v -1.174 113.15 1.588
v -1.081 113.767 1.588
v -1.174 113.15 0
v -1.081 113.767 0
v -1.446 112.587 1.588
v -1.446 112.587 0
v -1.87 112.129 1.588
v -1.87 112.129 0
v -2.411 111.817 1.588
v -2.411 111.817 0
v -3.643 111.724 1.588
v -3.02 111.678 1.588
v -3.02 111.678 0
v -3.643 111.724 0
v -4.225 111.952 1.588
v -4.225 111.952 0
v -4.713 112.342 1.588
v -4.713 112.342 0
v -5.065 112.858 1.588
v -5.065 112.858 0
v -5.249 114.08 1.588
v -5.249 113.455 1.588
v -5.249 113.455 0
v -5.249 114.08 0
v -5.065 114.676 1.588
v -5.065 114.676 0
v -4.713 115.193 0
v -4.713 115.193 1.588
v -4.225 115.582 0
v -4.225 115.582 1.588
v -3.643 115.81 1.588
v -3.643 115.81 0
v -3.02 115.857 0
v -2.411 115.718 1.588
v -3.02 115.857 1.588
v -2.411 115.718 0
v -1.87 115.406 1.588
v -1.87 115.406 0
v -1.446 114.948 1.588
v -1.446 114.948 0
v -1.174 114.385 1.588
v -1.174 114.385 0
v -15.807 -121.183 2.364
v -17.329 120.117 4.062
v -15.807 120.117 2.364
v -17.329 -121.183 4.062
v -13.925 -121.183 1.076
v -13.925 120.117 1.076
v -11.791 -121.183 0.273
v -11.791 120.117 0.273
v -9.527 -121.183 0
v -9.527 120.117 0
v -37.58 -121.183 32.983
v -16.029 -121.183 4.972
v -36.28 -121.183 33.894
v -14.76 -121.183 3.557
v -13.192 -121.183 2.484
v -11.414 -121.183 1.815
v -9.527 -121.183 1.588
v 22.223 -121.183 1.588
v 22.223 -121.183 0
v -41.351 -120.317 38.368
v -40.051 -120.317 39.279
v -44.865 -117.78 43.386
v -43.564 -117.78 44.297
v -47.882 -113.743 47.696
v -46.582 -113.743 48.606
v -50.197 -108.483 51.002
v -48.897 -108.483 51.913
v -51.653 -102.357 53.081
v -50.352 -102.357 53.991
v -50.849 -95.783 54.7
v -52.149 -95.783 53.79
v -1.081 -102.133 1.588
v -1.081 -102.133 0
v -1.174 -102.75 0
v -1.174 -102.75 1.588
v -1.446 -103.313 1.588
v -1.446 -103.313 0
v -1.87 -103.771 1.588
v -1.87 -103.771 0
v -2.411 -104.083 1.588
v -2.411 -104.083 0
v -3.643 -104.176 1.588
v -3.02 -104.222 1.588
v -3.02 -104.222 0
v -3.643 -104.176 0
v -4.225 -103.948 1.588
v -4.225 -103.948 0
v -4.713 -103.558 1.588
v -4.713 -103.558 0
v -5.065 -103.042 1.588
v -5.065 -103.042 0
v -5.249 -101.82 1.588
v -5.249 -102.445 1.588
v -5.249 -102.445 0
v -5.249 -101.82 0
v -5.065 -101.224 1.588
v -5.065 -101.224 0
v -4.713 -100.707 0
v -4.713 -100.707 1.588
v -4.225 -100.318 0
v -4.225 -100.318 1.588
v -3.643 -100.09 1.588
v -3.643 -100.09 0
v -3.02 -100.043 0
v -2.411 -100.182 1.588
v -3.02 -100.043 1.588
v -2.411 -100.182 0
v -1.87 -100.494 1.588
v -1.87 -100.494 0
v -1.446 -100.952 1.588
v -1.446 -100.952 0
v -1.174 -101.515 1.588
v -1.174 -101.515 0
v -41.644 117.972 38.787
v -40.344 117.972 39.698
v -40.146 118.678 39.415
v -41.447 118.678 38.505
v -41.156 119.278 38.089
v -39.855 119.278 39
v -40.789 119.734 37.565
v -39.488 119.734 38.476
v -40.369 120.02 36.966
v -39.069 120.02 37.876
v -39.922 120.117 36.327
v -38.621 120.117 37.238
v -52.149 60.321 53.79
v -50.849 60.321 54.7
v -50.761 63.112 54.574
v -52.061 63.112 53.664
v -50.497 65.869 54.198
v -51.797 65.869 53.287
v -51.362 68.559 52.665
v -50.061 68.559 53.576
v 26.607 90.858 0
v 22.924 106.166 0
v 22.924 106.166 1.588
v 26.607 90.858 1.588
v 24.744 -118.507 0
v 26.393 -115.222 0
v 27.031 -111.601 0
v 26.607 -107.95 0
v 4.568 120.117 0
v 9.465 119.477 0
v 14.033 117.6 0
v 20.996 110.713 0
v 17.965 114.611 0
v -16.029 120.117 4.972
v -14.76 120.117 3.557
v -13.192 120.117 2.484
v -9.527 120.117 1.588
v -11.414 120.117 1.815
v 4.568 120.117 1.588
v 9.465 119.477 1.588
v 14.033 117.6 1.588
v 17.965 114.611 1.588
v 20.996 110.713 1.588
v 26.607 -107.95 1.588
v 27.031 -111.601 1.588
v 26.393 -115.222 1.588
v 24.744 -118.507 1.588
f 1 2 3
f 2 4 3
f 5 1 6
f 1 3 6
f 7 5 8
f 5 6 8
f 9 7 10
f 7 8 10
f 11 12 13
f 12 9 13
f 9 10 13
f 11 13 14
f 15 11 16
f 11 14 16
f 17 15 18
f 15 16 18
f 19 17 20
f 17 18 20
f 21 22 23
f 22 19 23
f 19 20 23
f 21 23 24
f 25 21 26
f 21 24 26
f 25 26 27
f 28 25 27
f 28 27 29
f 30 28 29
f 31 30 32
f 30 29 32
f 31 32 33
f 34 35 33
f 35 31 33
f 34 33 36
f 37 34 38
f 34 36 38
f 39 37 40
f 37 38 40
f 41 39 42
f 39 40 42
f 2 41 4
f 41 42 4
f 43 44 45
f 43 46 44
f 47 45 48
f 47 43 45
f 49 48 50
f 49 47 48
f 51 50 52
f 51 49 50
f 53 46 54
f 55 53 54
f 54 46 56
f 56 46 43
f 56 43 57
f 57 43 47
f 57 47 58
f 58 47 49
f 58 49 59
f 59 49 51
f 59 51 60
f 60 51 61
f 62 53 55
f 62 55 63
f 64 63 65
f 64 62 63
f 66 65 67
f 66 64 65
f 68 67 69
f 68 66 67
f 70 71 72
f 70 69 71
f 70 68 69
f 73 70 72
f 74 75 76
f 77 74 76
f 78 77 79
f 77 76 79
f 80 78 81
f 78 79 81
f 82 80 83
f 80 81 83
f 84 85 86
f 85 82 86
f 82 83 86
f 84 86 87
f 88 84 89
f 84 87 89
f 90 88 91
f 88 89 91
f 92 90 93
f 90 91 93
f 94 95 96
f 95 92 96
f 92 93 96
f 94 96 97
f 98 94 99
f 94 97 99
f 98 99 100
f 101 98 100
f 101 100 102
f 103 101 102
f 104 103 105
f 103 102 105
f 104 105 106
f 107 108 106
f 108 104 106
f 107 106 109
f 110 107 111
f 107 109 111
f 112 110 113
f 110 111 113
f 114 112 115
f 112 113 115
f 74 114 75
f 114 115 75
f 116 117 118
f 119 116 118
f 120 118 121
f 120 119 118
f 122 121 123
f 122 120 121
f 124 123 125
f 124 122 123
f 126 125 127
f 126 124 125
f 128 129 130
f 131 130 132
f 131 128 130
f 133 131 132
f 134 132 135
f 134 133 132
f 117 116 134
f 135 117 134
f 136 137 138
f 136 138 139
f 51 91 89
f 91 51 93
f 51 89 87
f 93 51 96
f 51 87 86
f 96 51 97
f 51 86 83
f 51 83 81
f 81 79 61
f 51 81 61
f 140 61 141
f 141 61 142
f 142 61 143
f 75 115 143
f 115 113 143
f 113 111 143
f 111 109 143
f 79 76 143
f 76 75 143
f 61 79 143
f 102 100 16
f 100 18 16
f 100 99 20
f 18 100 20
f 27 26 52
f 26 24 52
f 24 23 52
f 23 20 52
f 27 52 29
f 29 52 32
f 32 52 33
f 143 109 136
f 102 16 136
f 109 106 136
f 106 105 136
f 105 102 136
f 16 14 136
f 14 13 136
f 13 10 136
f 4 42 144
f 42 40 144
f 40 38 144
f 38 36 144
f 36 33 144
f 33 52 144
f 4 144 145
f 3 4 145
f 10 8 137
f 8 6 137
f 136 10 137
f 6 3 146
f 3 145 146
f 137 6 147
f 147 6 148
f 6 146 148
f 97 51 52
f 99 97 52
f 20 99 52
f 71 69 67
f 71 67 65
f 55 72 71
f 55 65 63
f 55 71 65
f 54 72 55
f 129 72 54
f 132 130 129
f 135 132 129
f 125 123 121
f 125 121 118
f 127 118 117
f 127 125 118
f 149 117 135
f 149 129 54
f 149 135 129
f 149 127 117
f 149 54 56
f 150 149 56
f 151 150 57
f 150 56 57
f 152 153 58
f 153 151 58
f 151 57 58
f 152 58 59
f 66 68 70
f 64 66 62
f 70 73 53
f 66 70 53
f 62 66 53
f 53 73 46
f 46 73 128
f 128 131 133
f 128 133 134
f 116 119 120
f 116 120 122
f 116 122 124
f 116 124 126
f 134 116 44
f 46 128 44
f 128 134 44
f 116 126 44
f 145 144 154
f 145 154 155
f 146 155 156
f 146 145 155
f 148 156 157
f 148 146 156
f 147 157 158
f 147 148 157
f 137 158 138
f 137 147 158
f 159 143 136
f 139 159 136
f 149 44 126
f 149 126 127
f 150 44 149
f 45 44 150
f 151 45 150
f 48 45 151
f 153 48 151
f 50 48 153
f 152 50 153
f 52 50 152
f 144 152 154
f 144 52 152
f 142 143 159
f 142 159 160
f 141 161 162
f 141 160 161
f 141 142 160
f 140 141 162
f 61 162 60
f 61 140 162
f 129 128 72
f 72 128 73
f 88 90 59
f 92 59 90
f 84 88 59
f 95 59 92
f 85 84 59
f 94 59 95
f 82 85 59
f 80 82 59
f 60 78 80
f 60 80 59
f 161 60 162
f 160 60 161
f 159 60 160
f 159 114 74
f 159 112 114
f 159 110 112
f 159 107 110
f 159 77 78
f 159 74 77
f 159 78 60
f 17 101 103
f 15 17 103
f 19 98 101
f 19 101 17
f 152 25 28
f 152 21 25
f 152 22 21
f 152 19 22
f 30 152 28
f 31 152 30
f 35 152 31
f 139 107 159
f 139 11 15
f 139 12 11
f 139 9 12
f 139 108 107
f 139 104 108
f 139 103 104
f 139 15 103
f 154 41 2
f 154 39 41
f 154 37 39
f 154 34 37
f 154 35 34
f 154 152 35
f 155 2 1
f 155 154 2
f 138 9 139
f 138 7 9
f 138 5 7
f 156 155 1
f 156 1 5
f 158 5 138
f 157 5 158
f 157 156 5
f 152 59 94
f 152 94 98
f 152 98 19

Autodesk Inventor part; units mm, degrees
ref_plane "YZ Plane" through (0, 0, 0) normal (1, 0, 0) x (0, 1, 0)
ref_plane "XZ Plane" through (0, 0, 0) normal (0, 1, 0) x (-1, 0, 0)
ref_plane "XY Plane" through (0, 0, 0) normal (0, 0, 1) x (1, 0, 0)
sketch "Sketch1" plane through (0, 0, 0) normal (0, 0, 1) x (1, 0, 0)
  circle A0 centre (-3.1769, 113.7672) radius 2.0955
  circle A1 centre (-3.1769, -102.1328) radius 2.0955
  line L0 (-9.5269, 120.1172) -> (4.5684, 120.1172)
  line L1 (-9.5269, -121.1828) -> (-9.5269, 120.1172)
  line L2 (-9.5269, 120.1172) -> (-58.0591, 120.1172)
  line L3 (-79.3769, 60.3213) -> (-79.3769, -95.7828)
  line L4 (-9.5269, -121.1828) -> (-9.5269, 120.1172)
  line L5 (-61.0624, 117.9719) -> (-78.0039, 68.5592)
  arc A2 (-78.0039, 68.5592) -> (-79.3769, 60.3213) centre (-53.9769, 60.3213) ccw
  arc A3 (-79.3769, -95.7828) -> (-53.9769, -121.1828) centre (-53.9769, -95.7828) ccw
  arc A4 (-58.0591, 120.1172) -> (-61.0624, 117.9719) centre (-58.0591, 116.9422) ccw
  arc A5 (22.9235, 106.1658) -> (4.5684, 120.1172) centre (4.5684, 101.0672) ccw
  arc A6 (22.2231, -121.1828) -> (26.6067, -107.95) centre (14.337, -111.228) ccw
  line L6 (-41.2769, -121.1828) -> (22.2231, -121.1828)
  line L7 (26.6067, -107.95) -> (26.6067, 90.8579)
  line L8 (22.9235, 106.1658) -> (26.6067, 90.8579)
  line L9 (-53.9769, -121.1828) -> (-41.2769, -121.1828)
  point P0 (0, 0)
  point P1 (-79.3769, -121.1828)
  dimension "d0" = 4.191
  dimension "d1" = 4.191
  dimension "d2" = 69.85
  dimension "d3" = 25.4
  dimension "d4" = 3.175
  dimension "d5" = 19.05
  dimension "d16" = 12.7
  dimension "d18" = 63.5
extrude "Extrusion1" add sketch "Sketch1" along normal blind 1.5875
bend part "Bend Part1" radius 9.525 angle 55 line through (-9.5269, -121.1828, 0) along (0, 1, 0) centre toward (0, 0, 1) moving side (-1, 0, 0) both sides no
properties part number "wedge" material "Acetal Resin, White"
